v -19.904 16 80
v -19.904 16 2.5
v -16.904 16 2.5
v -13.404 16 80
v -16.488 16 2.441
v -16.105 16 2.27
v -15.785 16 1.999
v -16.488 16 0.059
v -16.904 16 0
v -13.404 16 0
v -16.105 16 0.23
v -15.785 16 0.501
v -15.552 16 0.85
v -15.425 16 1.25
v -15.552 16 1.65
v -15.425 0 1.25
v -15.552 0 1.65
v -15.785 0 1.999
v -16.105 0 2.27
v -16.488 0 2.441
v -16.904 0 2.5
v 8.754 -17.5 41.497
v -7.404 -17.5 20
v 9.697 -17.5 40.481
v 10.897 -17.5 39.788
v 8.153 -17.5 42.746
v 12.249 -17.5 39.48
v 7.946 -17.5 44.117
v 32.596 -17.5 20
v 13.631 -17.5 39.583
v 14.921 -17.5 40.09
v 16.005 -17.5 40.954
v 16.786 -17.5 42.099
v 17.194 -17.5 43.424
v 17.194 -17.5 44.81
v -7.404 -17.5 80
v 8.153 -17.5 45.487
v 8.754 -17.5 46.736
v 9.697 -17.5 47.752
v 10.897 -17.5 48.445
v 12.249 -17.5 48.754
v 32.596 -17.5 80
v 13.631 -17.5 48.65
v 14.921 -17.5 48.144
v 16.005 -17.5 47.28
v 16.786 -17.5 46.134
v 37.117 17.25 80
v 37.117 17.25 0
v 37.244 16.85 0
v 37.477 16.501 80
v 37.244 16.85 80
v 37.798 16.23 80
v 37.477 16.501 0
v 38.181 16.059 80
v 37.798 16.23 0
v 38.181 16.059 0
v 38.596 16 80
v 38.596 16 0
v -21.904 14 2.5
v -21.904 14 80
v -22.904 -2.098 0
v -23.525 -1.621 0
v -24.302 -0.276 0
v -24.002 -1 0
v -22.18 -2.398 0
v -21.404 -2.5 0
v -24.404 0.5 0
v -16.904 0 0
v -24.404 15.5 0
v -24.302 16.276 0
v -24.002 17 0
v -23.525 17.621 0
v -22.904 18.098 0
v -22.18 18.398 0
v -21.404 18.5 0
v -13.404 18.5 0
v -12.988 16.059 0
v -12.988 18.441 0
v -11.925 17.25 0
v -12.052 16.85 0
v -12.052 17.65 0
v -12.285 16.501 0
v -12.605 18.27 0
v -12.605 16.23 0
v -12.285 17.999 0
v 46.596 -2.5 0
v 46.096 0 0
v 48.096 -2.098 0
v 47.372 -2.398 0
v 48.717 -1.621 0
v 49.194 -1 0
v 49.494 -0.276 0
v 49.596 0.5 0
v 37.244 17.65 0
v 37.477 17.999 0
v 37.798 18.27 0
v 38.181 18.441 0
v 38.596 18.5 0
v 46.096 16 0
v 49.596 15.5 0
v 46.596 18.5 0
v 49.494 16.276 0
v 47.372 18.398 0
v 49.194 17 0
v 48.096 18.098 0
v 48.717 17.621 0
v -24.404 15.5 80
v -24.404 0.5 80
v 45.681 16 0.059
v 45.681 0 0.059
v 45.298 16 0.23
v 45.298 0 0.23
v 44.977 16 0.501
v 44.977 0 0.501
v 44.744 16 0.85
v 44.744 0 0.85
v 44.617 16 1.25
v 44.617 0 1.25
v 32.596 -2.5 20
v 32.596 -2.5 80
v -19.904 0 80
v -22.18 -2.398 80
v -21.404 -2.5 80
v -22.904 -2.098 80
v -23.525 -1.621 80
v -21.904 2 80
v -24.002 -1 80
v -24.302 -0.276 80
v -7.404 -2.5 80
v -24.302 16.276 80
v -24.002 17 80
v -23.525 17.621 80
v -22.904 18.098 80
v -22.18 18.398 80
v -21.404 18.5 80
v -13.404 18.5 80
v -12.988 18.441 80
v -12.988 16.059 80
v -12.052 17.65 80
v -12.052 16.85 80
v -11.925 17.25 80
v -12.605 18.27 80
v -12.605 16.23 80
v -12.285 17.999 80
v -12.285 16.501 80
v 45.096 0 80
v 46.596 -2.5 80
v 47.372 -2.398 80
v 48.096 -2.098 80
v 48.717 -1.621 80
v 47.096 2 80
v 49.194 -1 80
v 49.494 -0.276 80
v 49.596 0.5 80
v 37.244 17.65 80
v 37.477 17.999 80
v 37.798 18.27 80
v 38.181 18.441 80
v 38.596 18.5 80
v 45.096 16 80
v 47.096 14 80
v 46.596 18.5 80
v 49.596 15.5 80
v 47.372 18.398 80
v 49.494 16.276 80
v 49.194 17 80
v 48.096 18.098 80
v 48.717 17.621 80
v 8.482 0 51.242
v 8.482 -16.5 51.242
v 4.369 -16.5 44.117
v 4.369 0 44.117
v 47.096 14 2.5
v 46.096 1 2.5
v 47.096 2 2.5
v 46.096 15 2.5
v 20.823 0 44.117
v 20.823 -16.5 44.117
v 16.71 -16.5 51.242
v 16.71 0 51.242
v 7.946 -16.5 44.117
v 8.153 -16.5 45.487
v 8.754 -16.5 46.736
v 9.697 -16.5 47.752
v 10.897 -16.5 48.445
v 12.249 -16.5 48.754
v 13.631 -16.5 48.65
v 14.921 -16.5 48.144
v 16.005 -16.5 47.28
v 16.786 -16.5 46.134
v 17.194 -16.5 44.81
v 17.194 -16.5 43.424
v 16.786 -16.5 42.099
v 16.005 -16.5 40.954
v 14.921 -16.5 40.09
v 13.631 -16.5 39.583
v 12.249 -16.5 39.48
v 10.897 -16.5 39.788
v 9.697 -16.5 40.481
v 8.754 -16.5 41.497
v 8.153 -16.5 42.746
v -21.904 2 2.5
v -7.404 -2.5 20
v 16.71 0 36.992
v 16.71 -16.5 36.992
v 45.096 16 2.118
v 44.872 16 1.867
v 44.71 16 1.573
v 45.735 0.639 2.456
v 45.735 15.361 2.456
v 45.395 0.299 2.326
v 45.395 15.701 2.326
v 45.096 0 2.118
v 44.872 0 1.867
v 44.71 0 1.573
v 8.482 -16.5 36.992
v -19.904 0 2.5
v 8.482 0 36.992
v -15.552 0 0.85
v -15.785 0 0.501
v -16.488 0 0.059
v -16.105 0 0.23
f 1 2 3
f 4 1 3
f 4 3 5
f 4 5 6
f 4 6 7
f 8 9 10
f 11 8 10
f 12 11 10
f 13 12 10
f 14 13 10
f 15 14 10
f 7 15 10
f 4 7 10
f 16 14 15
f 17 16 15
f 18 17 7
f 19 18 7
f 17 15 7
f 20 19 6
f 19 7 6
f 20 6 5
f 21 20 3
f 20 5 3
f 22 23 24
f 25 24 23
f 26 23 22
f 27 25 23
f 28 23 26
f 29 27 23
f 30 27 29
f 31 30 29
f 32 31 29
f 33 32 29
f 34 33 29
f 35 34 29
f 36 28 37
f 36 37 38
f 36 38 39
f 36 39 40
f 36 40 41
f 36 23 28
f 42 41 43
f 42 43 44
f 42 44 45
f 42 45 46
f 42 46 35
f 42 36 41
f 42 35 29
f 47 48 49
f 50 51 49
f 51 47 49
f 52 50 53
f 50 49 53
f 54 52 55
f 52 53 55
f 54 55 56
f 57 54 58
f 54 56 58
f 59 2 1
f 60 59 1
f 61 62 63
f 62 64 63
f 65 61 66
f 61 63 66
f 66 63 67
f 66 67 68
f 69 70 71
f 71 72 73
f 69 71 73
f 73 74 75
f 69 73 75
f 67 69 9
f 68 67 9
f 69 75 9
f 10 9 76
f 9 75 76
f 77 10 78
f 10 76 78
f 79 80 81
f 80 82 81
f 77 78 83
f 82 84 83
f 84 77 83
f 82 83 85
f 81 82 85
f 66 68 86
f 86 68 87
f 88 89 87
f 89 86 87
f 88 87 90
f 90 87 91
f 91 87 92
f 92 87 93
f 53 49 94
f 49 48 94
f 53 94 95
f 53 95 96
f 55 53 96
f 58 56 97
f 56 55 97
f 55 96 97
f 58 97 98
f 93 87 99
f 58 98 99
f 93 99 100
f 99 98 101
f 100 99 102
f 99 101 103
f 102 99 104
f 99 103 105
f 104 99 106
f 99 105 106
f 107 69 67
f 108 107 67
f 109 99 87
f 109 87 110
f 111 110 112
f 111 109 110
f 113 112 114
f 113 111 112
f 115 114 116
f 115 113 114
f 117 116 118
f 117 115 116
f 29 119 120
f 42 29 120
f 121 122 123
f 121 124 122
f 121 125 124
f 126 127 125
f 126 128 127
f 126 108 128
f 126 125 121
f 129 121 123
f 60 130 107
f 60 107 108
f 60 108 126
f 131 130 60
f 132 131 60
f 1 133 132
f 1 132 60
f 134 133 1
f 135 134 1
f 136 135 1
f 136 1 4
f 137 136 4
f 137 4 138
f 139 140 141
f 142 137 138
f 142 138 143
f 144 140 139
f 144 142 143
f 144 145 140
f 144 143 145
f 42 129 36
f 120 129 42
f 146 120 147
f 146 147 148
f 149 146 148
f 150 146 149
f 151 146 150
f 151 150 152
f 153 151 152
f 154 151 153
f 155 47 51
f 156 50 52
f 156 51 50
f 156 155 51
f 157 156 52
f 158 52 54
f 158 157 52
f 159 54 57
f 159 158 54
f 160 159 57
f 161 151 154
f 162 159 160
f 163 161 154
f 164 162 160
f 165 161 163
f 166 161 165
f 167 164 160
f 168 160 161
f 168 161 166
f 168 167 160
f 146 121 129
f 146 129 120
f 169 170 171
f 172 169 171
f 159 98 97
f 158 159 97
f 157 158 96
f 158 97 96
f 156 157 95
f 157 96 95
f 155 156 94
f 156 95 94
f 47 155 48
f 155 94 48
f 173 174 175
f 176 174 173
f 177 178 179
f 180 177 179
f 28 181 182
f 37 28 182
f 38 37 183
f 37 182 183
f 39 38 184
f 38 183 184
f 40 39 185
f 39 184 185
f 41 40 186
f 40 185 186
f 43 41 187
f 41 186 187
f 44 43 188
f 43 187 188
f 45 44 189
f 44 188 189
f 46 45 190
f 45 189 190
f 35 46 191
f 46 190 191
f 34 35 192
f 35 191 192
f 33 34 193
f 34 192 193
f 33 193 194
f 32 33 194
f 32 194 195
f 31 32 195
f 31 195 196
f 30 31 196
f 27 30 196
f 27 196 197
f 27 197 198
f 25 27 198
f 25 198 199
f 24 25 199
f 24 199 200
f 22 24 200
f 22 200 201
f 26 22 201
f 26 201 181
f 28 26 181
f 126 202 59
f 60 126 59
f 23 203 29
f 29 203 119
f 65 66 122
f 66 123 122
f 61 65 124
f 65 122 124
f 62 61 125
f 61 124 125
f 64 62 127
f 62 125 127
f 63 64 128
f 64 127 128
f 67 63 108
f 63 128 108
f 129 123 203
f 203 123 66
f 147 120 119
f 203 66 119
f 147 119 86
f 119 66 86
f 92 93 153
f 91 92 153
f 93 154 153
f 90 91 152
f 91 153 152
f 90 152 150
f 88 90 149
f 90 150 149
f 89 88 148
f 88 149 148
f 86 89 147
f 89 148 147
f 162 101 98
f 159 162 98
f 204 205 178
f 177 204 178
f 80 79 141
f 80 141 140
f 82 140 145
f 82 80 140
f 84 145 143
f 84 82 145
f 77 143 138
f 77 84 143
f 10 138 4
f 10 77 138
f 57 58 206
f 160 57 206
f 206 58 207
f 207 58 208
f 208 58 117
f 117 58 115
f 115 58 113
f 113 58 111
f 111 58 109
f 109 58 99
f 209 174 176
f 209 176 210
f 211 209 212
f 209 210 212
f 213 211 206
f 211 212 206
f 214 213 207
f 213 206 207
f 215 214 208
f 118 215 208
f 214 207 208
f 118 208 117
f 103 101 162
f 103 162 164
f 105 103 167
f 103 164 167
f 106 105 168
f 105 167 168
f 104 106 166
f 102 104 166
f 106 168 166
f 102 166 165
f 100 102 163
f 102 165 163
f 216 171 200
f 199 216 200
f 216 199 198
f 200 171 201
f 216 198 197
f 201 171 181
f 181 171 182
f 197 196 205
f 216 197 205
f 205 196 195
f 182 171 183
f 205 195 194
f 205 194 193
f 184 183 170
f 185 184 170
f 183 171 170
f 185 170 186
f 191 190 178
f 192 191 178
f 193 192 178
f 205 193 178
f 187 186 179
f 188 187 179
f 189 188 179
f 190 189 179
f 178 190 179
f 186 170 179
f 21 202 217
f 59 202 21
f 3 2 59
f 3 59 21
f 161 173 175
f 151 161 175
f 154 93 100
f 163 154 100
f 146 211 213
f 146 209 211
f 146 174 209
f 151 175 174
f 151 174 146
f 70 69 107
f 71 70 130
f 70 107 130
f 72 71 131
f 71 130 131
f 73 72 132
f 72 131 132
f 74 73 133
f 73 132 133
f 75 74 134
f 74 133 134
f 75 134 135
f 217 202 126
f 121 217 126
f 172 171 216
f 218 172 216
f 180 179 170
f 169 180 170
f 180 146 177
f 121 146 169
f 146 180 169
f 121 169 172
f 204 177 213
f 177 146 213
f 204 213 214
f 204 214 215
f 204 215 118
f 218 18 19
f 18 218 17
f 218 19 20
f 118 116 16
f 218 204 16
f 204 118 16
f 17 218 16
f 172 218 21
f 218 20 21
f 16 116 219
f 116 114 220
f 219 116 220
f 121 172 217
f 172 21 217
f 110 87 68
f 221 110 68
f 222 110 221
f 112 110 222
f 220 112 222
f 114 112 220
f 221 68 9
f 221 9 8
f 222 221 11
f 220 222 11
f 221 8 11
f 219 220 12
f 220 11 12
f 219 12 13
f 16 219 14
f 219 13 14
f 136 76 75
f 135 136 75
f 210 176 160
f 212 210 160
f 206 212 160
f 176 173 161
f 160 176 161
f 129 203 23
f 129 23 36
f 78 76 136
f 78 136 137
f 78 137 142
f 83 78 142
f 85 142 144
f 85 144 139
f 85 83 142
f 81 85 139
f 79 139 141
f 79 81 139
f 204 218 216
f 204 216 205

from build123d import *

# Parameters (mm, degrees)
F1_DEPTH      = 80
F0_W          = 2.5
F0_H          = 16
F0_W_2        = 6.5
F2_DEPTH      = 2.5
F3_SIZE       = 2
F4_R          = 3
F5_T1_DEPTH   = 87.5
F5_T3_DEPTH   = 16
F5_T8_DEPTH   = 16
F7_W          = 40
F7_H          = 60
F8_DEPTH      = 15
F6_R          = 4.65
F9_DEPTH      = 14
F9_DEPTH_BACK = 25
F10_R         = 4.65
F11_DEPTH     = 25


# Not quite as in the source:
# - a fillet or chamfer that OpenCascade refuses, or shapes differently, is made with other operations: its cross-section is extruded or revolved along the edge and cut away or added


with BuildPart() as f1:
    # F0 (on Top) → F1 (new body)
    with BuildSketch(Plane.XY):
        Polygon((-11.9039647728, 18.5), (-24.4039647728, 18.5), (-24.4039647728, -2.5), (49.5960352272, -2.5), (49.5960352272, 18.5), (37.0960352272, 18.5), (37.0960352272, 16), (44.5960352272, 16), (47.0960352272, 16), (47.0960352272, 0), (44.5960352272, 0), (-15.4039647728, 0), (-21.9039647728, 0), (-21.9039647728, 16), (-15.4039647728, 16), (-11.9039647728, 16), align=None)
    extrude(amount=F1_DEPTH)

    # F0 (on Top) → F2 (join)
    with BuildSketch(Plane.XY):
        with Locations((45.8460352272, 8)):
            Rectangle(F0_W, F0_H)
        with Locations((-18.6539647728, 8)):
            Rectangle(F0_W_2, F0_H)
    extrude(amount=F2_DEPTH)

    # F3
    f3_edges = [f1.edges().sort_by_distance(p)[0] for p in [
        (47.096035, 0, 41.25),
        (47.096035, 16, 41.25),
        (-21.903965, 0, 41.25),
        (-21.903965, 16, 41.25),
    ]]
    chamfer(f3_edges, length=F3_SIZE)

    # F4
    f4_edges = [f1.edges().sort_by_distance(p)[0] for p in [
        (-24.403965, 18.5, 40),
        (-24.403965, -2.5, 40),
        (49.596035, -2.5, 40),
        (49.596035, 18.5, 40),
    ]]
    fillet(f4_edges, radius=F4_R)

    # F5: fillet of radius 1.5 on 8 edges, made by hand

    # F5_s2 → F5_t1 (cut)
    with BuildSketch(Plane.XY.offset(-3.75)):
        with BuildLine():
            ThreePointArc((-11.9039647728, 17.5), (-12.343304601, 16.4393398282), (-13.4039647728, 16))
            Line((-13.4039647728, 16), (-11.9039647728, 16))
            Line((-11.9039647728, 16), (-11.9039647728, 17.5))
        make_face()
        with BuildLine():
            ThreePointArc((-13.4039647728, 18.5), (-12.343304601, 18.0606601718), (-11.9039647728, 17))
            Line((-11.9039647728, 17), (-11.9039647728, 18.5))
            Line((-11.9039647728, 18.5), (-13.4039647728, 18.5))
        make_face()
        with BuildLine():
            ThreePointArc((38.5960352272, 18.5), (37.5353750554, 18.0606601718), (37.0960352272, 17))
            Line((37.0960352272, 17), (37.0960352272, 18.5))
            Line((37.0960352272, 18.5), (38.5960352272, 18.5))
        make_face()
        with BuildLine():
            ThreePointArc((37.0960352272, 17.5), (37.5353750554, 16.4393398282), (38.5960352272, 16))
            Line((38.5960352272, 16), (37.0960352272, 16))
            Line((37.0960352272, 16), (37.0960352272, 17.5))
        make_face()
    extrude(amount=F5_T1_DEPTH, mode=Mode.SUBTRACT)

    # F5_s4 → F5_t3 (cut)
    with BuildSketch(Plane.XZ.offset(-16)):
        with BuildLine():
            ThreePointArc((46.0960352272, 0), (45.0353750554, 0.4393398282), (44.5960352272, 1.5))
            Line((44.5960352272, 1.5), (44.5960352272, 0))
            Line((44.5960352272, 0), (46.0960352272, 0))
        make_face()
        with BuildLine():
            ThreePointArc((-15.4039647728, 1), (-15.843304601, 2.0606601718), (-16.9039647728, 2.5))
            Line((-16.9039647728, 2.5), (-15.4039647728, 2.5))
            Line((-15.4039647728, 2.5), (-15.4039647728, 1))
        make_face()
        with BuildLine():
            ThreePointArc((-16.9039647728, 0), (-15.843304601, 0.4393398282), (-15.4039647728, 1.5))
            Line((-15.4039647728, 1.5), (-15.4039647728, 0))
            Line((-15.4039647728, 0), (-16.9039647728, 0))
        make_face()
    extrude(amount=F5_T3_DEPTH, mode=Mode.SUBTRACT)


with BuildPart() as f5_tool6:
    # F5_s7 → F5_t8 (new body)
    with BuildSketch(Plane.XZ.offset(-16)):
        with BuildLine():
            ThreePointArc((46.0960352272, 2.5), (45.0353750554, 2.0606601718), (44.5960352272, 1))
            Line((44.5960352272, 1), (44.5960352272, 2.5))
            Line((44.5960352272, 2.5), (46.0960352272, 2.5))
        make_face()
    extrude(amount=F5_T8_DEPTH)

    split(bisect_by=Plane(origin=(30.5480176136, 30.5480176136, 0), x_dir=(0, 0, 1), z_dir=(-0.7071067812, -0.7071067812, 0)), keep=Keep.TOP)

    split(bisect_by=Plane(origin=(22.5480176136, -22.5480176136, 0), x_dir=(0, 0, 1), z_dir=(-0.7071067812, 0.7071067812, 0)), keep=Keep.TOP)


with BuildPart() as f1_1:
    add(f1.part)

    # F5_t5: cut F5_tool6
    add(f5_tool6.part, mode=Mode.SUBTRACT)

    # F7 (on face) → F8 (join)
    with BuildSketch(Plane.XZ.offset(2.5)):
        with Locations((12.5960352272, 50)):
            Rectangle(F7_W, F7_H)
    extrude(amount=F8_DEPTH)

    # F6 (on face) → F9 (cut, two sides)
    with BuildSketch(Plane.XZ.offset(2.5)) as f9_sk:
        Polygon((20.8232765631, 44.1168472171), (16.7096558952, 51.2418472171), (8.4824145592, 51.2418472171), (4.3687938912, 44.1168472171), (8.4824145592, 36.9918472171), (16.7096558952, 36.9918472171), align=None)
        with Locations((12.5960352272, 44.1168472171)):
            Circle(F6_R, mode=Mode.SUBTRACT)
    extrude(amount=F9_DEPTH, mode=Mode.SUBTRACT)
    extrude(f9_sk.sketch, amount=-F9_DEPTH_BACK, mode=Mode.SUBTRACT)

    # F10 (on face) → F11 (cut)
    with BuildSketch(Plane(origin=(0, 0, 0), x_dir=(-1, 0, 0), z_dir=(0, 1, 0))):
        with Locations((-12.5960352272, 44.1168472171)):
            Circle(F10_R)
    extrude(amount=-F11_DEPTH, mode=Mode.SUBTRACT)


solid = f1_1.part
